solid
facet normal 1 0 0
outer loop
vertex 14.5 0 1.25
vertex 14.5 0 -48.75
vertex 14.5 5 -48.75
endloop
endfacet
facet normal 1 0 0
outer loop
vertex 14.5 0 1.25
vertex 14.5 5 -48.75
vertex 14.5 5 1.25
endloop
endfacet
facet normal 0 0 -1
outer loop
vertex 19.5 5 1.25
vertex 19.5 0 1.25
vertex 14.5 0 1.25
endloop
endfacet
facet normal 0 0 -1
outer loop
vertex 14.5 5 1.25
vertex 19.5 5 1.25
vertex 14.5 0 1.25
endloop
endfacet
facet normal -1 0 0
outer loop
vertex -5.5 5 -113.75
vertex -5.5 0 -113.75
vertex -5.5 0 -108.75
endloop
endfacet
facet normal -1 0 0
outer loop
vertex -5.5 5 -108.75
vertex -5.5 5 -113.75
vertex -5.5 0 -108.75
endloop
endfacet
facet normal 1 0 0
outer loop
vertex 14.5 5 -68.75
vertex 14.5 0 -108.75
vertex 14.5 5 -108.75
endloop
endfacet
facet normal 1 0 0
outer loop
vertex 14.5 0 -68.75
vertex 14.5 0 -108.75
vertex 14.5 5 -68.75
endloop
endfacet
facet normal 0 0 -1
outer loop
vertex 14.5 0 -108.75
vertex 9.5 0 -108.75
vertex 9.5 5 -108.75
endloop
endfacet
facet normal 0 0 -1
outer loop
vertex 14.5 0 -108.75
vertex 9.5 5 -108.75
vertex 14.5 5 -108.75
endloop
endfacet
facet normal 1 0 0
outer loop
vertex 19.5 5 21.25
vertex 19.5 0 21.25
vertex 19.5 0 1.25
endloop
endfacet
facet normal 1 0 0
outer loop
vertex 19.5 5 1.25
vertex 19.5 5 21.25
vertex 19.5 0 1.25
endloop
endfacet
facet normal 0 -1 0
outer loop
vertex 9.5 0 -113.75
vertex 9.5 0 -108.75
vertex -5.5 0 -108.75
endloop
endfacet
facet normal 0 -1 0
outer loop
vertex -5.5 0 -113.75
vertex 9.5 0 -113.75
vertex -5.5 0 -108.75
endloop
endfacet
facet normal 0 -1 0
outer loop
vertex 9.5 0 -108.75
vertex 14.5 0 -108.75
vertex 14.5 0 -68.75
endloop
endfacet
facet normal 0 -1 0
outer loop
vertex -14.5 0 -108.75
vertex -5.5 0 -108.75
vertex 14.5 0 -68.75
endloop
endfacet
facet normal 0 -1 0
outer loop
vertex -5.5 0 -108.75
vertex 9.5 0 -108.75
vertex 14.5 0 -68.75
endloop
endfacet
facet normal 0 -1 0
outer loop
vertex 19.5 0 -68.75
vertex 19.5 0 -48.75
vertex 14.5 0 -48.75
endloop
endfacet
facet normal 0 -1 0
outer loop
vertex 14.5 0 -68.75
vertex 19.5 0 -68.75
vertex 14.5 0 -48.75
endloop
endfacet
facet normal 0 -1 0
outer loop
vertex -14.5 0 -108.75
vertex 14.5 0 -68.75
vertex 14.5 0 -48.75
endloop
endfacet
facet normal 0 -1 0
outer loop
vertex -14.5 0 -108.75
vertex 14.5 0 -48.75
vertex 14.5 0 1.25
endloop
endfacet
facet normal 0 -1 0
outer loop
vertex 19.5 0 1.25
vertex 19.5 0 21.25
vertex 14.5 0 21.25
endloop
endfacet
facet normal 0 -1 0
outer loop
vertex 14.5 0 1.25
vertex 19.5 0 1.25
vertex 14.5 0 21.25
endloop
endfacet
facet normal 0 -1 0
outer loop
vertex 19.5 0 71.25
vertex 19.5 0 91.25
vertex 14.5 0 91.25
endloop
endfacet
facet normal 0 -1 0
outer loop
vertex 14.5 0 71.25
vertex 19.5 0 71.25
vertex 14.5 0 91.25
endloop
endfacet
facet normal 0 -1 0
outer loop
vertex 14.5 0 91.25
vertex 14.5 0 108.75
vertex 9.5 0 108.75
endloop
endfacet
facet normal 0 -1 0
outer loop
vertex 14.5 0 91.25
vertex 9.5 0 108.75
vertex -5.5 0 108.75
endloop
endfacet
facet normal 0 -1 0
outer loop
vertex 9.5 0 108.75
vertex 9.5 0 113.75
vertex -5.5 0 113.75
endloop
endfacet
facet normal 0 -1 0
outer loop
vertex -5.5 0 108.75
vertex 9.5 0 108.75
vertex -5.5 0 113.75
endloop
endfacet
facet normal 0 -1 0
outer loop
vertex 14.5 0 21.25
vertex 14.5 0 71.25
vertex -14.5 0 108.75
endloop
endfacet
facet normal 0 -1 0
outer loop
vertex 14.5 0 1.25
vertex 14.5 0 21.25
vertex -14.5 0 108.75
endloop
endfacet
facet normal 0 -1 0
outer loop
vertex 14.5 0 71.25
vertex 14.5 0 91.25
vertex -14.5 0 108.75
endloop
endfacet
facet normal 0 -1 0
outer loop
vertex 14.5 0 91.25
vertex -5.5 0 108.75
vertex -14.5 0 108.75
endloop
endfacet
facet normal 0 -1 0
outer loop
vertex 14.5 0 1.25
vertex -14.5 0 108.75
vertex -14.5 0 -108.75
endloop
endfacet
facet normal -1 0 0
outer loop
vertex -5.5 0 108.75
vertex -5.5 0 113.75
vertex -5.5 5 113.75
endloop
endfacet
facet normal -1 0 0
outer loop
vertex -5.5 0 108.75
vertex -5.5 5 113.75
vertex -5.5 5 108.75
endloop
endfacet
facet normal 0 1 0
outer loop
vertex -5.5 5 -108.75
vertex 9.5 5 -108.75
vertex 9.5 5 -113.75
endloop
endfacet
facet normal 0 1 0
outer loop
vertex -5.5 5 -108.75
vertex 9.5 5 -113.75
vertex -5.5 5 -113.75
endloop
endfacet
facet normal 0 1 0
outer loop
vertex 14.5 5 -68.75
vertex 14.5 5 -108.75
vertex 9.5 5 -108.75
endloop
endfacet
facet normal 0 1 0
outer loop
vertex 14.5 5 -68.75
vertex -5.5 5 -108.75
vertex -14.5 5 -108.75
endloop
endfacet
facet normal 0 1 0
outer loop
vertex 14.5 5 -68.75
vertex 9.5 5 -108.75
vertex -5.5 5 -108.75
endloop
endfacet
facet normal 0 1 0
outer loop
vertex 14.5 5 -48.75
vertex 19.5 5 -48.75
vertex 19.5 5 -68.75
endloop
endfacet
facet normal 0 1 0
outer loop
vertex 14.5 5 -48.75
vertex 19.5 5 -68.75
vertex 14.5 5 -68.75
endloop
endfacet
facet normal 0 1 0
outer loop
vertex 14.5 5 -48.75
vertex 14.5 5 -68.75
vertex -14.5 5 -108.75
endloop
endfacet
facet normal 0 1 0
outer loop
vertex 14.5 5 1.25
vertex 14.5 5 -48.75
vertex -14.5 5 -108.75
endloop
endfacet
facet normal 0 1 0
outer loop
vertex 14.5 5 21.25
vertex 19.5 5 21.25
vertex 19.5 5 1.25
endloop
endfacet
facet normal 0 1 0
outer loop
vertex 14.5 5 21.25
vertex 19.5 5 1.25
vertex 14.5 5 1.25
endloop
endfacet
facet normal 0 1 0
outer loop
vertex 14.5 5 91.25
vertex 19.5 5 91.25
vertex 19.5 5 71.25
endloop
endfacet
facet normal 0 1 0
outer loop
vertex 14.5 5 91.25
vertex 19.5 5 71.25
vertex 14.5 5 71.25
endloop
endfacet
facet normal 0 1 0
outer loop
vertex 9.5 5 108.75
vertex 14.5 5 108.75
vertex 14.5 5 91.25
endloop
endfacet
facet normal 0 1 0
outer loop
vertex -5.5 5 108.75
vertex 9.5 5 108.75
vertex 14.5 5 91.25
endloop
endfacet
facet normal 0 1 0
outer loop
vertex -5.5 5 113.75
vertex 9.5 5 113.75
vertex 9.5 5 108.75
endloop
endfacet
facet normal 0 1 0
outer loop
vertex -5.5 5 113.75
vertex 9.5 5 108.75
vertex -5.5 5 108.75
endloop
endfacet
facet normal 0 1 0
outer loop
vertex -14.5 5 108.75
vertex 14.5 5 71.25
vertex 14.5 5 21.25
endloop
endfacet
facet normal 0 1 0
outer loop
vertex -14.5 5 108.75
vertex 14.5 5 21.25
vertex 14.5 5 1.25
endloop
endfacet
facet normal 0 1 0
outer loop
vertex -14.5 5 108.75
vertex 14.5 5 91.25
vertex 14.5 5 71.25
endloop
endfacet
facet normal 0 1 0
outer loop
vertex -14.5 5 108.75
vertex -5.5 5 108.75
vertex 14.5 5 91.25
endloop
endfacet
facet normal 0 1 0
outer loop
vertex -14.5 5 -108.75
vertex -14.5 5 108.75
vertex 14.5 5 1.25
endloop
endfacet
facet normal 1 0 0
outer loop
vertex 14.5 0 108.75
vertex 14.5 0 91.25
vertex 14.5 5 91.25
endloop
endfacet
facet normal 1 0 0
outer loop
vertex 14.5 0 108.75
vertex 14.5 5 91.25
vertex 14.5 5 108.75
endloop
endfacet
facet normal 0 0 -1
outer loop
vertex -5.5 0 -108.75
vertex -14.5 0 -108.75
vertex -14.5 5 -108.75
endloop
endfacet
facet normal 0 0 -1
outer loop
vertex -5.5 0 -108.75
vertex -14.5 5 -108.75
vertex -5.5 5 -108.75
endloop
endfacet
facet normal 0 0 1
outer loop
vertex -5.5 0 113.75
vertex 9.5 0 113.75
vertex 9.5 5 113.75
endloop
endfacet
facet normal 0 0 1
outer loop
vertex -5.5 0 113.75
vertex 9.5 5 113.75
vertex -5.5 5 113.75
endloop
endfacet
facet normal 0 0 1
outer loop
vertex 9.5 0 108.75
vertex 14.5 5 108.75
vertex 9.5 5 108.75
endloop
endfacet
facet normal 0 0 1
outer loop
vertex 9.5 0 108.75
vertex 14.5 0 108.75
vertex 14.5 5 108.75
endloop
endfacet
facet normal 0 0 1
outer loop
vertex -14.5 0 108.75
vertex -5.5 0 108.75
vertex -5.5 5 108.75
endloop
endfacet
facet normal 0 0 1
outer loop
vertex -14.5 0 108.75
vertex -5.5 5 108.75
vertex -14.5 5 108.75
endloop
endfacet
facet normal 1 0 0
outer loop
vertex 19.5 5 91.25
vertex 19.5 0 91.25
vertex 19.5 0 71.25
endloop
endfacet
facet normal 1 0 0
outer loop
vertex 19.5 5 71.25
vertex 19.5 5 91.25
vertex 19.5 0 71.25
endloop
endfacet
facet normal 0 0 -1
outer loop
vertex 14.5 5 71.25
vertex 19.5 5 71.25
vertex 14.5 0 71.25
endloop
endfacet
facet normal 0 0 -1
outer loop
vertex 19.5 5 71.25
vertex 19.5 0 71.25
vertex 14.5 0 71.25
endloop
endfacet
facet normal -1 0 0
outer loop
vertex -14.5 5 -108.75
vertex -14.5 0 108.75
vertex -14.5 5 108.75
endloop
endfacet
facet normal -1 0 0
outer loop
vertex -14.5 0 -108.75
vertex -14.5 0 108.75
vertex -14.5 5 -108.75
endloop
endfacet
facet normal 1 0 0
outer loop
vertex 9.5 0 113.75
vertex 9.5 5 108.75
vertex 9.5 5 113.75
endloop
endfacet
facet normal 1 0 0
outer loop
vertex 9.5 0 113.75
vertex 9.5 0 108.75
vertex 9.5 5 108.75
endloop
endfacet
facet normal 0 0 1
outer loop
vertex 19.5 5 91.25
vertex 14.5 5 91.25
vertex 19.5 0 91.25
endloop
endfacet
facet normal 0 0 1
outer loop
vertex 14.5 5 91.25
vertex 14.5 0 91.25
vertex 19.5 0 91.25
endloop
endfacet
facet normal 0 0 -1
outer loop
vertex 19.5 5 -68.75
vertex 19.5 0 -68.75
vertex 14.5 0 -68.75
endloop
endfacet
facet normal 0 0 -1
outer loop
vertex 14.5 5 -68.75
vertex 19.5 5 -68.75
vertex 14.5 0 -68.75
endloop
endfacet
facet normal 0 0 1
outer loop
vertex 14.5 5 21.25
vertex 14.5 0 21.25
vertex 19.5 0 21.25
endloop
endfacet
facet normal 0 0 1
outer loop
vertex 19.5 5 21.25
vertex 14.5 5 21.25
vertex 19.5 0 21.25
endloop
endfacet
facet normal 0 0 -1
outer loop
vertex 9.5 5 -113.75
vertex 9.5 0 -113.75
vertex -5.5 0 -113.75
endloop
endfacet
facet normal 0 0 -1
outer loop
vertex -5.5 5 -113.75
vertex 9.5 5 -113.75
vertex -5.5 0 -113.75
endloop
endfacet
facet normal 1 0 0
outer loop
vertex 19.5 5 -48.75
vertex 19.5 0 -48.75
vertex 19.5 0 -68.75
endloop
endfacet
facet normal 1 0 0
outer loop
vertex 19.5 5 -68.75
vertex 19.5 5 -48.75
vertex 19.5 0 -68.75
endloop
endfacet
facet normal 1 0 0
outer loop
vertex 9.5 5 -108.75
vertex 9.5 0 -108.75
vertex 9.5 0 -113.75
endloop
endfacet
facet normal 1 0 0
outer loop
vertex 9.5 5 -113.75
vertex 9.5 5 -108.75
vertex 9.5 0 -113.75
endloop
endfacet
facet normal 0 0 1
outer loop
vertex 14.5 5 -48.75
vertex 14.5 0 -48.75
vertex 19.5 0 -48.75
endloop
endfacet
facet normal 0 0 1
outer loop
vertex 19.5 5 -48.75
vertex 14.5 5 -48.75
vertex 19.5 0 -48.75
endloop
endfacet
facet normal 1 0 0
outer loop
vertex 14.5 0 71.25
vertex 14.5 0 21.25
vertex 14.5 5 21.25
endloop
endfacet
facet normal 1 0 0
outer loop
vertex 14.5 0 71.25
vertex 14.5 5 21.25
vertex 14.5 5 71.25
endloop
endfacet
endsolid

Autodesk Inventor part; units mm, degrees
ref_plane "YZ Plane" through (0, 0, 0) normal (1, 0, 0) x (0, 1, 0)
ref_plane "XZ Plane" through (0, 0, 0) normal (0, 1, 0) x (-1, 0, 0)
ref_plane "XY Plane" through (0, 0, 0) normal (0, 0, 1) x (1, 0, 0)
sketch "Sketch1" plane through (0, 0, 0) normal (0, 1, 0) x (-1, 0, 0)
  line L0 (-14.5, 108.75) -> (14.5, 108.75)
  line L1 (14.5, 108.75) -> (14.5, -108.75)
  line L2 (14.5, -108.75) -> (-14.5, -108.75)
  line L3 (-14.5, -108.75) -> (-14.5, 108.75)
  line L4 (-14.5, 108.75) -> (14.5, -108.75) construction
  line L5 (14.5, 108.75) -> (-14.5, -108.75) construction
  line L6 (-14.5, 91.25) -> (-19.5, 91.25)
  line L7 (-19.5, 91.25) -> (-19.5, 71.25)
  line L8 (-19.5, 71.25) -> (-14.5, 71.25)
  line L9 (-14.5, 71.25) -> (-14.5, 91.25)
  line L10 (-14.5, 21.25) -> (-19.5, 21.25)
  line L11 (-19.5, 21.25) -> (-19.5, 1.25)
  line L12 (-19.5, 1.25) -> (-14.5, 1.25)
  line L13 (-14.5, 1.25) -> (-14.5, 21.25)
  line L14 (-14.5, -48.75) -> (-19.5, -48.75)
  line L15 (-19.5, -48.75) -> (-19.5, -68.75)
  line L16 (-19.5, -68.75) -> (-14.5, -68.75)
  line L17 (-14.5, -68.75) -> (-14.5, -48.75)
  line L18 (5.5, 108.75) -> (-9.5, 108.75)
  line L19 (-9.5, 108.75) -> (-9.5, 113.75)
  line L20 (-9.5, 113.75) -> (5.5, 113.75)
  line L21 (5.5, 113.75) -> (5.5, 108.75)
  line L22 (5.5, -108.75) -> (-9.5, -108.75)
  line L23 (-9.5, -108.75) -> (-9.5, -113.75)
  line L24 (-9.5, -113.75) -> (5.5, -113.75)
  line L25 (5.5, -113.75) -> (5.5, -108.75)
  point P0 (0, 0)
  point P1 (-14.5, 71.25)
  point P2 (-14.5, 1.25)
  point P3 (-14.5, -68.75)
  dimension "d0" = 29
  dimension "d2" = 5
  dimension "d3" = 20
  dimension "d4" = 20
  dimension "d5" = 20
  dimension "d6" = 50
  dimension "d7" = 50
  dimension "d8" = 17.5
  dimension "d10" = 15
  dimension "d11" = 9
  dimension "d14" = 5
  dimension "d15" = 40
  dimension "d16" = 15
  dimension "d17" = 5
  dimension "d18" = 9
extrude "Extrusion1" add sketch "Sketch1" along normal blind 5
equation "\"BendRadius\" = Thickness"
equation "\"BendReliefWidth\" = Thickness"
equation "\"BendReliefDepth\" = 0.5 * Thickness"
equation "\"CornerReliefSize\" = 4 * Thickness"
equation "\"MinimumRemnant\" = 2 * Thickness"
equation "\"TransitionRadius\" = BendRadius"
equation "\"JacobiRadiusSize\" = BendRadius"
equation "\"GapSize\" = Thickness"
equation "\"Thickness\" = 3.048"
properties part number "Manija1"
